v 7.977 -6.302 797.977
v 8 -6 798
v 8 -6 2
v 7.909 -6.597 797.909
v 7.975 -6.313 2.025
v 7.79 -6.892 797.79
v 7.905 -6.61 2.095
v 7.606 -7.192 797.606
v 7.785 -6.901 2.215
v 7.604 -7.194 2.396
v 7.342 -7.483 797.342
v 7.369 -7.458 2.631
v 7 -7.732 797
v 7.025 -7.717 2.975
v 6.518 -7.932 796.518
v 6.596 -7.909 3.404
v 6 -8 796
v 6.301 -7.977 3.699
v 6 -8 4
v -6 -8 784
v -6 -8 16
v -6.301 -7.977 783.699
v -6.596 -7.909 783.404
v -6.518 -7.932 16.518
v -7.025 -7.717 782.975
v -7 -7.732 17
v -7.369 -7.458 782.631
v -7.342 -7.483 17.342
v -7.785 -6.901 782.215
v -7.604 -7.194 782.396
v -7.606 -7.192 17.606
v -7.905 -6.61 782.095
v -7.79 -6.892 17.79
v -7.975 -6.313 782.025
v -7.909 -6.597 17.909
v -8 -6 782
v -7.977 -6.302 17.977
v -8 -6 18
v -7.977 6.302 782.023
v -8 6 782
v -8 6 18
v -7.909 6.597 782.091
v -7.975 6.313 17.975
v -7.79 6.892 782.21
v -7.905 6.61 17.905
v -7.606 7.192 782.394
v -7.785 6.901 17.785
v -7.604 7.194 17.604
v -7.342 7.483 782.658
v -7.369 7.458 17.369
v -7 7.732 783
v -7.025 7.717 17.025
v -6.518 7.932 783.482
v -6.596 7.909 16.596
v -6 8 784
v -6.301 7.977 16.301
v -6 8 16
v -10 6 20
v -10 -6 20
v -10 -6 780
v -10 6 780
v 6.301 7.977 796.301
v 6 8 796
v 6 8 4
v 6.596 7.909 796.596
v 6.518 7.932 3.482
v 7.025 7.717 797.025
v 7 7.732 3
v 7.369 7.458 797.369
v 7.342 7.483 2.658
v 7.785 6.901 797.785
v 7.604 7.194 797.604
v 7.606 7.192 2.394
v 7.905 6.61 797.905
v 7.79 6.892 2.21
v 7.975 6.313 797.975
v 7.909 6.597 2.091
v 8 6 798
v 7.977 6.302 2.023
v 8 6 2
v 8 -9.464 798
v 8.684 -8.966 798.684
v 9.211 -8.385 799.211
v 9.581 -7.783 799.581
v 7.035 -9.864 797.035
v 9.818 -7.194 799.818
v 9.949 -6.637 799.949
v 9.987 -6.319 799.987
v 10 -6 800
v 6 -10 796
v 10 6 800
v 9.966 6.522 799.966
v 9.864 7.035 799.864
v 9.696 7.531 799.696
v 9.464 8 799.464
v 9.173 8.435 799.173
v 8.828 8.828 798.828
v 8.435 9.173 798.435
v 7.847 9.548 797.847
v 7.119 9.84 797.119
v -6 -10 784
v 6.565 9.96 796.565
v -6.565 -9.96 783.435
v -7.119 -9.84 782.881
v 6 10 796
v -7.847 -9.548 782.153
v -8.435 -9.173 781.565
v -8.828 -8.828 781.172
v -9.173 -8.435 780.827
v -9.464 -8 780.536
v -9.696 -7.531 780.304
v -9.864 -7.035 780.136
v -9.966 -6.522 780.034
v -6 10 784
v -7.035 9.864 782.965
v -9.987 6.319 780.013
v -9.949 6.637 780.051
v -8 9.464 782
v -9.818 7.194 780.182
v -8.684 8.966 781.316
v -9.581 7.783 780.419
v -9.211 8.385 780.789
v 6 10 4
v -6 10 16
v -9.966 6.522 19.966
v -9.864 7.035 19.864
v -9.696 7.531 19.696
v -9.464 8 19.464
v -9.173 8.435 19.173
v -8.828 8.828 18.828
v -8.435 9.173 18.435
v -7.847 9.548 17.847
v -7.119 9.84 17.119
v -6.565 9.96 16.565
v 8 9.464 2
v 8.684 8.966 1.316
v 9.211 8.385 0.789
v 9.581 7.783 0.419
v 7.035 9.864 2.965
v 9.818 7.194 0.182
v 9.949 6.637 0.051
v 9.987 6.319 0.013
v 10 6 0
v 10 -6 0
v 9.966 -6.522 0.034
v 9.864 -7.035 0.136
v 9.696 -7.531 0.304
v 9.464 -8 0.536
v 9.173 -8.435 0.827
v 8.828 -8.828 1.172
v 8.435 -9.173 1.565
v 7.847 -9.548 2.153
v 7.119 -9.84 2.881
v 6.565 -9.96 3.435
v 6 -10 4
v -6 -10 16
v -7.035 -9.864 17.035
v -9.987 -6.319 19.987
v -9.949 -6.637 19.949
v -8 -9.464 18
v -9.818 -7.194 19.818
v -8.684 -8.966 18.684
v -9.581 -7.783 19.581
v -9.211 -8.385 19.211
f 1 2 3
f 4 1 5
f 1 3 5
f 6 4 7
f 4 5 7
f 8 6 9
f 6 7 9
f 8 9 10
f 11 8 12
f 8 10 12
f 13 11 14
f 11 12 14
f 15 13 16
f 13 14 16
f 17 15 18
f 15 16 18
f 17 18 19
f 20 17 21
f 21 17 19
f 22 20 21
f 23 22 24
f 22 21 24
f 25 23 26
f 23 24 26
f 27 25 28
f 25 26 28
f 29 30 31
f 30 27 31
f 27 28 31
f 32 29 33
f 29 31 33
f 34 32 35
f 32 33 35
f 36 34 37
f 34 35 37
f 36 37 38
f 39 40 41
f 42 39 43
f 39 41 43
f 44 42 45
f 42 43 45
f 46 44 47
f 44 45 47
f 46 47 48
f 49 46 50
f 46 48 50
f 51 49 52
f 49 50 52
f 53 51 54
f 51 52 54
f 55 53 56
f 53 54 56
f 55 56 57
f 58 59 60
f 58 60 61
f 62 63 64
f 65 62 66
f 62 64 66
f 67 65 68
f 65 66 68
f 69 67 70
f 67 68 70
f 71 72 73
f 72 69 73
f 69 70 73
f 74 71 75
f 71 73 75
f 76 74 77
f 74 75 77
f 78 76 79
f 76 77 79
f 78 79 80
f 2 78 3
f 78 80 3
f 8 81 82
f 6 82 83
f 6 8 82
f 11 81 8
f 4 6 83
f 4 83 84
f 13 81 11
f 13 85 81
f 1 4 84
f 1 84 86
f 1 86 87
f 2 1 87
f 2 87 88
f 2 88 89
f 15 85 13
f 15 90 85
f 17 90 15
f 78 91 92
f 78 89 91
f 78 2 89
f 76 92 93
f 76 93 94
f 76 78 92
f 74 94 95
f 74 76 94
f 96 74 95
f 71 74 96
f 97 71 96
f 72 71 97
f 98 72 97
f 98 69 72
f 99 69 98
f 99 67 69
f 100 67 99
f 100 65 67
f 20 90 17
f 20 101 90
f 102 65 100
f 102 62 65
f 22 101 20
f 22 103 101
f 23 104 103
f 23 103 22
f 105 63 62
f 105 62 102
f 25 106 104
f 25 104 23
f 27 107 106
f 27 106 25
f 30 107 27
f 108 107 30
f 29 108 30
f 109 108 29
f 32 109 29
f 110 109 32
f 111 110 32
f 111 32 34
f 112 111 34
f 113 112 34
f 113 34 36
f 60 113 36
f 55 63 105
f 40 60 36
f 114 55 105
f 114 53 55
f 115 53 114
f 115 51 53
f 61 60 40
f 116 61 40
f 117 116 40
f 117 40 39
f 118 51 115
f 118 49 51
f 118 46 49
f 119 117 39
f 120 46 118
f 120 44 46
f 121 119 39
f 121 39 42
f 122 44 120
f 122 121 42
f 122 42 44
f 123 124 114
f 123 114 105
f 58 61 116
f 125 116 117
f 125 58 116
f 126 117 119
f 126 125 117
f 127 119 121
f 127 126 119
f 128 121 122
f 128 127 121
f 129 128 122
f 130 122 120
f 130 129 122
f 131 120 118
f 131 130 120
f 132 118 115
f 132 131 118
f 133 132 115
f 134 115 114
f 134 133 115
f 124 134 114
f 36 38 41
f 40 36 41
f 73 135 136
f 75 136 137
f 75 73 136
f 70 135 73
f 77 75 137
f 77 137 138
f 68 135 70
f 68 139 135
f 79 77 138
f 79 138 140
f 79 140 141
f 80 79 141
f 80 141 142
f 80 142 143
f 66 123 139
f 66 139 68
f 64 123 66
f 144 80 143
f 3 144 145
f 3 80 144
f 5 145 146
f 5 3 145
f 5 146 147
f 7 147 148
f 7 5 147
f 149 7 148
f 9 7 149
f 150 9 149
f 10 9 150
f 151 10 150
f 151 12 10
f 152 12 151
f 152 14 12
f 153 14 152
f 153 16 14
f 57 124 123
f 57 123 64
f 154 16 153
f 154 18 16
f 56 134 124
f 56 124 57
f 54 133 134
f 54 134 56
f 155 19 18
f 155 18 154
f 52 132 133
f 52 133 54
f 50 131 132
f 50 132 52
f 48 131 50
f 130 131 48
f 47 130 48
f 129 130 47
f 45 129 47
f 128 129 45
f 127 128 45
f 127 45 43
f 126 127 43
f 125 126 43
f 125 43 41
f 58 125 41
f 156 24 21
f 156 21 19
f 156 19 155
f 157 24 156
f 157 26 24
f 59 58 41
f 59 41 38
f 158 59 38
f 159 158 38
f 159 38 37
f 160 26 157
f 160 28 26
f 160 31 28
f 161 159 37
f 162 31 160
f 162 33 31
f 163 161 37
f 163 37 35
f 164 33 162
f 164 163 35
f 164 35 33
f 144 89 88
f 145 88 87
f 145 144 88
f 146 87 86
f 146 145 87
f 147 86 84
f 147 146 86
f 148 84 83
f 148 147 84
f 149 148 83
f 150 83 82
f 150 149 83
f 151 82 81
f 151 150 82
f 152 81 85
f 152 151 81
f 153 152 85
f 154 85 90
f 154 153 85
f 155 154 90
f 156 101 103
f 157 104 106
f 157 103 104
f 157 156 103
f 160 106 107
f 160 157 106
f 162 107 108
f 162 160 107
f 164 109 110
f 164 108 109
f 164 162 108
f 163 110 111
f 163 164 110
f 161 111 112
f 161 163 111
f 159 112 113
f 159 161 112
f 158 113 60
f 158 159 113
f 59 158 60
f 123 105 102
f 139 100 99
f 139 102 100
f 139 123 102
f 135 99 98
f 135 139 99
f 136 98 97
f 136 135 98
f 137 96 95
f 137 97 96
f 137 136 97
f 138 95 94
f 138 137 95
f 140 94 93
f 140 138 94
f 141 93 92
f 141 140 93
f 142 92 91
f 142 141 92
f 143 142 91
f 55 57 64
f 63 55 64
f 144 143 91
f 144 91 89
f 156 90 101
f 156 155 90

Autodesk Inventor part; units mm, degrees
ref_plane "Start plane" through (0, 0, 0) normal (0, 0, 1) x (1, 0, 0)
ref_plane "End plane" through (0, 0, 800) normal (0, 0, 1) x (1, 0, 0)
sketch "Sketch" plane through (0, 0, 0) normal (0, 0, 1) x (1, 0, 0)
  line L0 (-10, -6) -> (-10, 6)
  line L1 (-6, 10) -> (6, 10)
  line L2 (10, 6) -> (10, -6)
  line L3 (6, -10) -> (-6, -10)
  arc A0 (-10, -6) -> (-6, -10) centre (-6, -6) ccw
  arc A1 (10, 6) -> (6, 10) centre (6, 6) ccw
  arc A2 (-6, 10) -> (-10, 6) centre (-6, 6) ccw
  arc A3 (6, -10) -> (10, -6) centre (6, -6) ccw
  arc A4 (-6, 8) -> (-8, 6) centre (-6, 6) ccw
  line L4 (-6, 8) -> (6, 8)
  arc A5 (8, 6) -> (6, 8) centre (6, 6) ccw
  line L5 (8, 6) -> (8, -6)
  arc A6 (6, -8) -> (8, -6) centre (6, -6) ccw
  line L6 (6, -8) -> (-6, -8)
  arc A7 (-8, -6) -> (-6, -8) centre (-6, -6) ccw
  line L7 (-8, -6) -> (-8, 6)
  line L8 (0, 15.1598) -> (0, -15.1598) construction
  line L9 (-15.1598, 0) -> (15.1598, 0) construction
  dimension "d7" = 4
  dimension "d9" = 20
  dimension "d11" = 20
  dimension "d12" = 2
  dimension "d15" = 10
  dimension "d16" = 10
extrude "Body" add sketch "Sketch" along normal up to surface (800 mm away) from surface at 0
sketch "Sketch3" plane through (0, 0, 0) normal (0, 0, 1) x (1, 0, 0)
  line L0 (0, 0) -> (10, 0)
ref_plane "Work Plane3" through (0, 0, 0) normal (0, -1, 0) x (1, 0, 0)
sketch "Sketch4" plane through (0, 0, 0) normal (0, -1, 0) x (1, 0, 0)
  line L0 (-2, 0) -> (12, 0)
  line L1 (-2, 800) -> (12, 800)
  dimension "d18" = 800
ref_plane "Work Plane4" through (0, -1090, 0) normal (0, 0, -1) x (-1, 0, 0)
split "Split1" plane through (0, -1090, 0) removes the side toward (0, 0, -1)
ref_plane "Work Plane5" through (10, 0, 0) normal (-0.7071, 0, -0.7071) x (-0.7071, 0, 0.7071)
split "Split2" plane through (10, 0, 0) removes the side toward (-0.7071, 0, -0.7071)
ref_plane "Work Plane6" through (10, 0, 800) normal (-0.7071, 0, 0.7071) x (0.7071, 0, 0.7071)
split "Split3" plane through (10, 0, 800) removes the side toward (-0.7071, 0, 0.7071)
ref_plane "Work Plane7" through (0, 10, 800) normal (0, 0, 1) x (1, 0, 0)
split "Split4" plane through (0, 10, 800) removes the side toward (0, 0, 1)
equation "\"d7\" = G_IR"
equation "\"d9\" = G_W"
equation "\"d11\" = G_H"
equation "\"d12\" = G_T"
equation "\"d15\" = 0.5 * d9"
equation "\"d16\" = 0.5 * d11"
equation "\"d3\" = G_L"
equation "\"G_W\" = 20"
equation "\"G_H\" = 20"
equation "\"G_T\" = 2"
equation "\"G_IR\" = 4"
equation "\"G_L\" = d18"
equation "\"G_OFFSET_START\" = 0"
equation "\"G_OFFSET_END\" = 0"
properties part number "ISO 4019 - 20x20x2 - 800" material "Steel, Mild"
